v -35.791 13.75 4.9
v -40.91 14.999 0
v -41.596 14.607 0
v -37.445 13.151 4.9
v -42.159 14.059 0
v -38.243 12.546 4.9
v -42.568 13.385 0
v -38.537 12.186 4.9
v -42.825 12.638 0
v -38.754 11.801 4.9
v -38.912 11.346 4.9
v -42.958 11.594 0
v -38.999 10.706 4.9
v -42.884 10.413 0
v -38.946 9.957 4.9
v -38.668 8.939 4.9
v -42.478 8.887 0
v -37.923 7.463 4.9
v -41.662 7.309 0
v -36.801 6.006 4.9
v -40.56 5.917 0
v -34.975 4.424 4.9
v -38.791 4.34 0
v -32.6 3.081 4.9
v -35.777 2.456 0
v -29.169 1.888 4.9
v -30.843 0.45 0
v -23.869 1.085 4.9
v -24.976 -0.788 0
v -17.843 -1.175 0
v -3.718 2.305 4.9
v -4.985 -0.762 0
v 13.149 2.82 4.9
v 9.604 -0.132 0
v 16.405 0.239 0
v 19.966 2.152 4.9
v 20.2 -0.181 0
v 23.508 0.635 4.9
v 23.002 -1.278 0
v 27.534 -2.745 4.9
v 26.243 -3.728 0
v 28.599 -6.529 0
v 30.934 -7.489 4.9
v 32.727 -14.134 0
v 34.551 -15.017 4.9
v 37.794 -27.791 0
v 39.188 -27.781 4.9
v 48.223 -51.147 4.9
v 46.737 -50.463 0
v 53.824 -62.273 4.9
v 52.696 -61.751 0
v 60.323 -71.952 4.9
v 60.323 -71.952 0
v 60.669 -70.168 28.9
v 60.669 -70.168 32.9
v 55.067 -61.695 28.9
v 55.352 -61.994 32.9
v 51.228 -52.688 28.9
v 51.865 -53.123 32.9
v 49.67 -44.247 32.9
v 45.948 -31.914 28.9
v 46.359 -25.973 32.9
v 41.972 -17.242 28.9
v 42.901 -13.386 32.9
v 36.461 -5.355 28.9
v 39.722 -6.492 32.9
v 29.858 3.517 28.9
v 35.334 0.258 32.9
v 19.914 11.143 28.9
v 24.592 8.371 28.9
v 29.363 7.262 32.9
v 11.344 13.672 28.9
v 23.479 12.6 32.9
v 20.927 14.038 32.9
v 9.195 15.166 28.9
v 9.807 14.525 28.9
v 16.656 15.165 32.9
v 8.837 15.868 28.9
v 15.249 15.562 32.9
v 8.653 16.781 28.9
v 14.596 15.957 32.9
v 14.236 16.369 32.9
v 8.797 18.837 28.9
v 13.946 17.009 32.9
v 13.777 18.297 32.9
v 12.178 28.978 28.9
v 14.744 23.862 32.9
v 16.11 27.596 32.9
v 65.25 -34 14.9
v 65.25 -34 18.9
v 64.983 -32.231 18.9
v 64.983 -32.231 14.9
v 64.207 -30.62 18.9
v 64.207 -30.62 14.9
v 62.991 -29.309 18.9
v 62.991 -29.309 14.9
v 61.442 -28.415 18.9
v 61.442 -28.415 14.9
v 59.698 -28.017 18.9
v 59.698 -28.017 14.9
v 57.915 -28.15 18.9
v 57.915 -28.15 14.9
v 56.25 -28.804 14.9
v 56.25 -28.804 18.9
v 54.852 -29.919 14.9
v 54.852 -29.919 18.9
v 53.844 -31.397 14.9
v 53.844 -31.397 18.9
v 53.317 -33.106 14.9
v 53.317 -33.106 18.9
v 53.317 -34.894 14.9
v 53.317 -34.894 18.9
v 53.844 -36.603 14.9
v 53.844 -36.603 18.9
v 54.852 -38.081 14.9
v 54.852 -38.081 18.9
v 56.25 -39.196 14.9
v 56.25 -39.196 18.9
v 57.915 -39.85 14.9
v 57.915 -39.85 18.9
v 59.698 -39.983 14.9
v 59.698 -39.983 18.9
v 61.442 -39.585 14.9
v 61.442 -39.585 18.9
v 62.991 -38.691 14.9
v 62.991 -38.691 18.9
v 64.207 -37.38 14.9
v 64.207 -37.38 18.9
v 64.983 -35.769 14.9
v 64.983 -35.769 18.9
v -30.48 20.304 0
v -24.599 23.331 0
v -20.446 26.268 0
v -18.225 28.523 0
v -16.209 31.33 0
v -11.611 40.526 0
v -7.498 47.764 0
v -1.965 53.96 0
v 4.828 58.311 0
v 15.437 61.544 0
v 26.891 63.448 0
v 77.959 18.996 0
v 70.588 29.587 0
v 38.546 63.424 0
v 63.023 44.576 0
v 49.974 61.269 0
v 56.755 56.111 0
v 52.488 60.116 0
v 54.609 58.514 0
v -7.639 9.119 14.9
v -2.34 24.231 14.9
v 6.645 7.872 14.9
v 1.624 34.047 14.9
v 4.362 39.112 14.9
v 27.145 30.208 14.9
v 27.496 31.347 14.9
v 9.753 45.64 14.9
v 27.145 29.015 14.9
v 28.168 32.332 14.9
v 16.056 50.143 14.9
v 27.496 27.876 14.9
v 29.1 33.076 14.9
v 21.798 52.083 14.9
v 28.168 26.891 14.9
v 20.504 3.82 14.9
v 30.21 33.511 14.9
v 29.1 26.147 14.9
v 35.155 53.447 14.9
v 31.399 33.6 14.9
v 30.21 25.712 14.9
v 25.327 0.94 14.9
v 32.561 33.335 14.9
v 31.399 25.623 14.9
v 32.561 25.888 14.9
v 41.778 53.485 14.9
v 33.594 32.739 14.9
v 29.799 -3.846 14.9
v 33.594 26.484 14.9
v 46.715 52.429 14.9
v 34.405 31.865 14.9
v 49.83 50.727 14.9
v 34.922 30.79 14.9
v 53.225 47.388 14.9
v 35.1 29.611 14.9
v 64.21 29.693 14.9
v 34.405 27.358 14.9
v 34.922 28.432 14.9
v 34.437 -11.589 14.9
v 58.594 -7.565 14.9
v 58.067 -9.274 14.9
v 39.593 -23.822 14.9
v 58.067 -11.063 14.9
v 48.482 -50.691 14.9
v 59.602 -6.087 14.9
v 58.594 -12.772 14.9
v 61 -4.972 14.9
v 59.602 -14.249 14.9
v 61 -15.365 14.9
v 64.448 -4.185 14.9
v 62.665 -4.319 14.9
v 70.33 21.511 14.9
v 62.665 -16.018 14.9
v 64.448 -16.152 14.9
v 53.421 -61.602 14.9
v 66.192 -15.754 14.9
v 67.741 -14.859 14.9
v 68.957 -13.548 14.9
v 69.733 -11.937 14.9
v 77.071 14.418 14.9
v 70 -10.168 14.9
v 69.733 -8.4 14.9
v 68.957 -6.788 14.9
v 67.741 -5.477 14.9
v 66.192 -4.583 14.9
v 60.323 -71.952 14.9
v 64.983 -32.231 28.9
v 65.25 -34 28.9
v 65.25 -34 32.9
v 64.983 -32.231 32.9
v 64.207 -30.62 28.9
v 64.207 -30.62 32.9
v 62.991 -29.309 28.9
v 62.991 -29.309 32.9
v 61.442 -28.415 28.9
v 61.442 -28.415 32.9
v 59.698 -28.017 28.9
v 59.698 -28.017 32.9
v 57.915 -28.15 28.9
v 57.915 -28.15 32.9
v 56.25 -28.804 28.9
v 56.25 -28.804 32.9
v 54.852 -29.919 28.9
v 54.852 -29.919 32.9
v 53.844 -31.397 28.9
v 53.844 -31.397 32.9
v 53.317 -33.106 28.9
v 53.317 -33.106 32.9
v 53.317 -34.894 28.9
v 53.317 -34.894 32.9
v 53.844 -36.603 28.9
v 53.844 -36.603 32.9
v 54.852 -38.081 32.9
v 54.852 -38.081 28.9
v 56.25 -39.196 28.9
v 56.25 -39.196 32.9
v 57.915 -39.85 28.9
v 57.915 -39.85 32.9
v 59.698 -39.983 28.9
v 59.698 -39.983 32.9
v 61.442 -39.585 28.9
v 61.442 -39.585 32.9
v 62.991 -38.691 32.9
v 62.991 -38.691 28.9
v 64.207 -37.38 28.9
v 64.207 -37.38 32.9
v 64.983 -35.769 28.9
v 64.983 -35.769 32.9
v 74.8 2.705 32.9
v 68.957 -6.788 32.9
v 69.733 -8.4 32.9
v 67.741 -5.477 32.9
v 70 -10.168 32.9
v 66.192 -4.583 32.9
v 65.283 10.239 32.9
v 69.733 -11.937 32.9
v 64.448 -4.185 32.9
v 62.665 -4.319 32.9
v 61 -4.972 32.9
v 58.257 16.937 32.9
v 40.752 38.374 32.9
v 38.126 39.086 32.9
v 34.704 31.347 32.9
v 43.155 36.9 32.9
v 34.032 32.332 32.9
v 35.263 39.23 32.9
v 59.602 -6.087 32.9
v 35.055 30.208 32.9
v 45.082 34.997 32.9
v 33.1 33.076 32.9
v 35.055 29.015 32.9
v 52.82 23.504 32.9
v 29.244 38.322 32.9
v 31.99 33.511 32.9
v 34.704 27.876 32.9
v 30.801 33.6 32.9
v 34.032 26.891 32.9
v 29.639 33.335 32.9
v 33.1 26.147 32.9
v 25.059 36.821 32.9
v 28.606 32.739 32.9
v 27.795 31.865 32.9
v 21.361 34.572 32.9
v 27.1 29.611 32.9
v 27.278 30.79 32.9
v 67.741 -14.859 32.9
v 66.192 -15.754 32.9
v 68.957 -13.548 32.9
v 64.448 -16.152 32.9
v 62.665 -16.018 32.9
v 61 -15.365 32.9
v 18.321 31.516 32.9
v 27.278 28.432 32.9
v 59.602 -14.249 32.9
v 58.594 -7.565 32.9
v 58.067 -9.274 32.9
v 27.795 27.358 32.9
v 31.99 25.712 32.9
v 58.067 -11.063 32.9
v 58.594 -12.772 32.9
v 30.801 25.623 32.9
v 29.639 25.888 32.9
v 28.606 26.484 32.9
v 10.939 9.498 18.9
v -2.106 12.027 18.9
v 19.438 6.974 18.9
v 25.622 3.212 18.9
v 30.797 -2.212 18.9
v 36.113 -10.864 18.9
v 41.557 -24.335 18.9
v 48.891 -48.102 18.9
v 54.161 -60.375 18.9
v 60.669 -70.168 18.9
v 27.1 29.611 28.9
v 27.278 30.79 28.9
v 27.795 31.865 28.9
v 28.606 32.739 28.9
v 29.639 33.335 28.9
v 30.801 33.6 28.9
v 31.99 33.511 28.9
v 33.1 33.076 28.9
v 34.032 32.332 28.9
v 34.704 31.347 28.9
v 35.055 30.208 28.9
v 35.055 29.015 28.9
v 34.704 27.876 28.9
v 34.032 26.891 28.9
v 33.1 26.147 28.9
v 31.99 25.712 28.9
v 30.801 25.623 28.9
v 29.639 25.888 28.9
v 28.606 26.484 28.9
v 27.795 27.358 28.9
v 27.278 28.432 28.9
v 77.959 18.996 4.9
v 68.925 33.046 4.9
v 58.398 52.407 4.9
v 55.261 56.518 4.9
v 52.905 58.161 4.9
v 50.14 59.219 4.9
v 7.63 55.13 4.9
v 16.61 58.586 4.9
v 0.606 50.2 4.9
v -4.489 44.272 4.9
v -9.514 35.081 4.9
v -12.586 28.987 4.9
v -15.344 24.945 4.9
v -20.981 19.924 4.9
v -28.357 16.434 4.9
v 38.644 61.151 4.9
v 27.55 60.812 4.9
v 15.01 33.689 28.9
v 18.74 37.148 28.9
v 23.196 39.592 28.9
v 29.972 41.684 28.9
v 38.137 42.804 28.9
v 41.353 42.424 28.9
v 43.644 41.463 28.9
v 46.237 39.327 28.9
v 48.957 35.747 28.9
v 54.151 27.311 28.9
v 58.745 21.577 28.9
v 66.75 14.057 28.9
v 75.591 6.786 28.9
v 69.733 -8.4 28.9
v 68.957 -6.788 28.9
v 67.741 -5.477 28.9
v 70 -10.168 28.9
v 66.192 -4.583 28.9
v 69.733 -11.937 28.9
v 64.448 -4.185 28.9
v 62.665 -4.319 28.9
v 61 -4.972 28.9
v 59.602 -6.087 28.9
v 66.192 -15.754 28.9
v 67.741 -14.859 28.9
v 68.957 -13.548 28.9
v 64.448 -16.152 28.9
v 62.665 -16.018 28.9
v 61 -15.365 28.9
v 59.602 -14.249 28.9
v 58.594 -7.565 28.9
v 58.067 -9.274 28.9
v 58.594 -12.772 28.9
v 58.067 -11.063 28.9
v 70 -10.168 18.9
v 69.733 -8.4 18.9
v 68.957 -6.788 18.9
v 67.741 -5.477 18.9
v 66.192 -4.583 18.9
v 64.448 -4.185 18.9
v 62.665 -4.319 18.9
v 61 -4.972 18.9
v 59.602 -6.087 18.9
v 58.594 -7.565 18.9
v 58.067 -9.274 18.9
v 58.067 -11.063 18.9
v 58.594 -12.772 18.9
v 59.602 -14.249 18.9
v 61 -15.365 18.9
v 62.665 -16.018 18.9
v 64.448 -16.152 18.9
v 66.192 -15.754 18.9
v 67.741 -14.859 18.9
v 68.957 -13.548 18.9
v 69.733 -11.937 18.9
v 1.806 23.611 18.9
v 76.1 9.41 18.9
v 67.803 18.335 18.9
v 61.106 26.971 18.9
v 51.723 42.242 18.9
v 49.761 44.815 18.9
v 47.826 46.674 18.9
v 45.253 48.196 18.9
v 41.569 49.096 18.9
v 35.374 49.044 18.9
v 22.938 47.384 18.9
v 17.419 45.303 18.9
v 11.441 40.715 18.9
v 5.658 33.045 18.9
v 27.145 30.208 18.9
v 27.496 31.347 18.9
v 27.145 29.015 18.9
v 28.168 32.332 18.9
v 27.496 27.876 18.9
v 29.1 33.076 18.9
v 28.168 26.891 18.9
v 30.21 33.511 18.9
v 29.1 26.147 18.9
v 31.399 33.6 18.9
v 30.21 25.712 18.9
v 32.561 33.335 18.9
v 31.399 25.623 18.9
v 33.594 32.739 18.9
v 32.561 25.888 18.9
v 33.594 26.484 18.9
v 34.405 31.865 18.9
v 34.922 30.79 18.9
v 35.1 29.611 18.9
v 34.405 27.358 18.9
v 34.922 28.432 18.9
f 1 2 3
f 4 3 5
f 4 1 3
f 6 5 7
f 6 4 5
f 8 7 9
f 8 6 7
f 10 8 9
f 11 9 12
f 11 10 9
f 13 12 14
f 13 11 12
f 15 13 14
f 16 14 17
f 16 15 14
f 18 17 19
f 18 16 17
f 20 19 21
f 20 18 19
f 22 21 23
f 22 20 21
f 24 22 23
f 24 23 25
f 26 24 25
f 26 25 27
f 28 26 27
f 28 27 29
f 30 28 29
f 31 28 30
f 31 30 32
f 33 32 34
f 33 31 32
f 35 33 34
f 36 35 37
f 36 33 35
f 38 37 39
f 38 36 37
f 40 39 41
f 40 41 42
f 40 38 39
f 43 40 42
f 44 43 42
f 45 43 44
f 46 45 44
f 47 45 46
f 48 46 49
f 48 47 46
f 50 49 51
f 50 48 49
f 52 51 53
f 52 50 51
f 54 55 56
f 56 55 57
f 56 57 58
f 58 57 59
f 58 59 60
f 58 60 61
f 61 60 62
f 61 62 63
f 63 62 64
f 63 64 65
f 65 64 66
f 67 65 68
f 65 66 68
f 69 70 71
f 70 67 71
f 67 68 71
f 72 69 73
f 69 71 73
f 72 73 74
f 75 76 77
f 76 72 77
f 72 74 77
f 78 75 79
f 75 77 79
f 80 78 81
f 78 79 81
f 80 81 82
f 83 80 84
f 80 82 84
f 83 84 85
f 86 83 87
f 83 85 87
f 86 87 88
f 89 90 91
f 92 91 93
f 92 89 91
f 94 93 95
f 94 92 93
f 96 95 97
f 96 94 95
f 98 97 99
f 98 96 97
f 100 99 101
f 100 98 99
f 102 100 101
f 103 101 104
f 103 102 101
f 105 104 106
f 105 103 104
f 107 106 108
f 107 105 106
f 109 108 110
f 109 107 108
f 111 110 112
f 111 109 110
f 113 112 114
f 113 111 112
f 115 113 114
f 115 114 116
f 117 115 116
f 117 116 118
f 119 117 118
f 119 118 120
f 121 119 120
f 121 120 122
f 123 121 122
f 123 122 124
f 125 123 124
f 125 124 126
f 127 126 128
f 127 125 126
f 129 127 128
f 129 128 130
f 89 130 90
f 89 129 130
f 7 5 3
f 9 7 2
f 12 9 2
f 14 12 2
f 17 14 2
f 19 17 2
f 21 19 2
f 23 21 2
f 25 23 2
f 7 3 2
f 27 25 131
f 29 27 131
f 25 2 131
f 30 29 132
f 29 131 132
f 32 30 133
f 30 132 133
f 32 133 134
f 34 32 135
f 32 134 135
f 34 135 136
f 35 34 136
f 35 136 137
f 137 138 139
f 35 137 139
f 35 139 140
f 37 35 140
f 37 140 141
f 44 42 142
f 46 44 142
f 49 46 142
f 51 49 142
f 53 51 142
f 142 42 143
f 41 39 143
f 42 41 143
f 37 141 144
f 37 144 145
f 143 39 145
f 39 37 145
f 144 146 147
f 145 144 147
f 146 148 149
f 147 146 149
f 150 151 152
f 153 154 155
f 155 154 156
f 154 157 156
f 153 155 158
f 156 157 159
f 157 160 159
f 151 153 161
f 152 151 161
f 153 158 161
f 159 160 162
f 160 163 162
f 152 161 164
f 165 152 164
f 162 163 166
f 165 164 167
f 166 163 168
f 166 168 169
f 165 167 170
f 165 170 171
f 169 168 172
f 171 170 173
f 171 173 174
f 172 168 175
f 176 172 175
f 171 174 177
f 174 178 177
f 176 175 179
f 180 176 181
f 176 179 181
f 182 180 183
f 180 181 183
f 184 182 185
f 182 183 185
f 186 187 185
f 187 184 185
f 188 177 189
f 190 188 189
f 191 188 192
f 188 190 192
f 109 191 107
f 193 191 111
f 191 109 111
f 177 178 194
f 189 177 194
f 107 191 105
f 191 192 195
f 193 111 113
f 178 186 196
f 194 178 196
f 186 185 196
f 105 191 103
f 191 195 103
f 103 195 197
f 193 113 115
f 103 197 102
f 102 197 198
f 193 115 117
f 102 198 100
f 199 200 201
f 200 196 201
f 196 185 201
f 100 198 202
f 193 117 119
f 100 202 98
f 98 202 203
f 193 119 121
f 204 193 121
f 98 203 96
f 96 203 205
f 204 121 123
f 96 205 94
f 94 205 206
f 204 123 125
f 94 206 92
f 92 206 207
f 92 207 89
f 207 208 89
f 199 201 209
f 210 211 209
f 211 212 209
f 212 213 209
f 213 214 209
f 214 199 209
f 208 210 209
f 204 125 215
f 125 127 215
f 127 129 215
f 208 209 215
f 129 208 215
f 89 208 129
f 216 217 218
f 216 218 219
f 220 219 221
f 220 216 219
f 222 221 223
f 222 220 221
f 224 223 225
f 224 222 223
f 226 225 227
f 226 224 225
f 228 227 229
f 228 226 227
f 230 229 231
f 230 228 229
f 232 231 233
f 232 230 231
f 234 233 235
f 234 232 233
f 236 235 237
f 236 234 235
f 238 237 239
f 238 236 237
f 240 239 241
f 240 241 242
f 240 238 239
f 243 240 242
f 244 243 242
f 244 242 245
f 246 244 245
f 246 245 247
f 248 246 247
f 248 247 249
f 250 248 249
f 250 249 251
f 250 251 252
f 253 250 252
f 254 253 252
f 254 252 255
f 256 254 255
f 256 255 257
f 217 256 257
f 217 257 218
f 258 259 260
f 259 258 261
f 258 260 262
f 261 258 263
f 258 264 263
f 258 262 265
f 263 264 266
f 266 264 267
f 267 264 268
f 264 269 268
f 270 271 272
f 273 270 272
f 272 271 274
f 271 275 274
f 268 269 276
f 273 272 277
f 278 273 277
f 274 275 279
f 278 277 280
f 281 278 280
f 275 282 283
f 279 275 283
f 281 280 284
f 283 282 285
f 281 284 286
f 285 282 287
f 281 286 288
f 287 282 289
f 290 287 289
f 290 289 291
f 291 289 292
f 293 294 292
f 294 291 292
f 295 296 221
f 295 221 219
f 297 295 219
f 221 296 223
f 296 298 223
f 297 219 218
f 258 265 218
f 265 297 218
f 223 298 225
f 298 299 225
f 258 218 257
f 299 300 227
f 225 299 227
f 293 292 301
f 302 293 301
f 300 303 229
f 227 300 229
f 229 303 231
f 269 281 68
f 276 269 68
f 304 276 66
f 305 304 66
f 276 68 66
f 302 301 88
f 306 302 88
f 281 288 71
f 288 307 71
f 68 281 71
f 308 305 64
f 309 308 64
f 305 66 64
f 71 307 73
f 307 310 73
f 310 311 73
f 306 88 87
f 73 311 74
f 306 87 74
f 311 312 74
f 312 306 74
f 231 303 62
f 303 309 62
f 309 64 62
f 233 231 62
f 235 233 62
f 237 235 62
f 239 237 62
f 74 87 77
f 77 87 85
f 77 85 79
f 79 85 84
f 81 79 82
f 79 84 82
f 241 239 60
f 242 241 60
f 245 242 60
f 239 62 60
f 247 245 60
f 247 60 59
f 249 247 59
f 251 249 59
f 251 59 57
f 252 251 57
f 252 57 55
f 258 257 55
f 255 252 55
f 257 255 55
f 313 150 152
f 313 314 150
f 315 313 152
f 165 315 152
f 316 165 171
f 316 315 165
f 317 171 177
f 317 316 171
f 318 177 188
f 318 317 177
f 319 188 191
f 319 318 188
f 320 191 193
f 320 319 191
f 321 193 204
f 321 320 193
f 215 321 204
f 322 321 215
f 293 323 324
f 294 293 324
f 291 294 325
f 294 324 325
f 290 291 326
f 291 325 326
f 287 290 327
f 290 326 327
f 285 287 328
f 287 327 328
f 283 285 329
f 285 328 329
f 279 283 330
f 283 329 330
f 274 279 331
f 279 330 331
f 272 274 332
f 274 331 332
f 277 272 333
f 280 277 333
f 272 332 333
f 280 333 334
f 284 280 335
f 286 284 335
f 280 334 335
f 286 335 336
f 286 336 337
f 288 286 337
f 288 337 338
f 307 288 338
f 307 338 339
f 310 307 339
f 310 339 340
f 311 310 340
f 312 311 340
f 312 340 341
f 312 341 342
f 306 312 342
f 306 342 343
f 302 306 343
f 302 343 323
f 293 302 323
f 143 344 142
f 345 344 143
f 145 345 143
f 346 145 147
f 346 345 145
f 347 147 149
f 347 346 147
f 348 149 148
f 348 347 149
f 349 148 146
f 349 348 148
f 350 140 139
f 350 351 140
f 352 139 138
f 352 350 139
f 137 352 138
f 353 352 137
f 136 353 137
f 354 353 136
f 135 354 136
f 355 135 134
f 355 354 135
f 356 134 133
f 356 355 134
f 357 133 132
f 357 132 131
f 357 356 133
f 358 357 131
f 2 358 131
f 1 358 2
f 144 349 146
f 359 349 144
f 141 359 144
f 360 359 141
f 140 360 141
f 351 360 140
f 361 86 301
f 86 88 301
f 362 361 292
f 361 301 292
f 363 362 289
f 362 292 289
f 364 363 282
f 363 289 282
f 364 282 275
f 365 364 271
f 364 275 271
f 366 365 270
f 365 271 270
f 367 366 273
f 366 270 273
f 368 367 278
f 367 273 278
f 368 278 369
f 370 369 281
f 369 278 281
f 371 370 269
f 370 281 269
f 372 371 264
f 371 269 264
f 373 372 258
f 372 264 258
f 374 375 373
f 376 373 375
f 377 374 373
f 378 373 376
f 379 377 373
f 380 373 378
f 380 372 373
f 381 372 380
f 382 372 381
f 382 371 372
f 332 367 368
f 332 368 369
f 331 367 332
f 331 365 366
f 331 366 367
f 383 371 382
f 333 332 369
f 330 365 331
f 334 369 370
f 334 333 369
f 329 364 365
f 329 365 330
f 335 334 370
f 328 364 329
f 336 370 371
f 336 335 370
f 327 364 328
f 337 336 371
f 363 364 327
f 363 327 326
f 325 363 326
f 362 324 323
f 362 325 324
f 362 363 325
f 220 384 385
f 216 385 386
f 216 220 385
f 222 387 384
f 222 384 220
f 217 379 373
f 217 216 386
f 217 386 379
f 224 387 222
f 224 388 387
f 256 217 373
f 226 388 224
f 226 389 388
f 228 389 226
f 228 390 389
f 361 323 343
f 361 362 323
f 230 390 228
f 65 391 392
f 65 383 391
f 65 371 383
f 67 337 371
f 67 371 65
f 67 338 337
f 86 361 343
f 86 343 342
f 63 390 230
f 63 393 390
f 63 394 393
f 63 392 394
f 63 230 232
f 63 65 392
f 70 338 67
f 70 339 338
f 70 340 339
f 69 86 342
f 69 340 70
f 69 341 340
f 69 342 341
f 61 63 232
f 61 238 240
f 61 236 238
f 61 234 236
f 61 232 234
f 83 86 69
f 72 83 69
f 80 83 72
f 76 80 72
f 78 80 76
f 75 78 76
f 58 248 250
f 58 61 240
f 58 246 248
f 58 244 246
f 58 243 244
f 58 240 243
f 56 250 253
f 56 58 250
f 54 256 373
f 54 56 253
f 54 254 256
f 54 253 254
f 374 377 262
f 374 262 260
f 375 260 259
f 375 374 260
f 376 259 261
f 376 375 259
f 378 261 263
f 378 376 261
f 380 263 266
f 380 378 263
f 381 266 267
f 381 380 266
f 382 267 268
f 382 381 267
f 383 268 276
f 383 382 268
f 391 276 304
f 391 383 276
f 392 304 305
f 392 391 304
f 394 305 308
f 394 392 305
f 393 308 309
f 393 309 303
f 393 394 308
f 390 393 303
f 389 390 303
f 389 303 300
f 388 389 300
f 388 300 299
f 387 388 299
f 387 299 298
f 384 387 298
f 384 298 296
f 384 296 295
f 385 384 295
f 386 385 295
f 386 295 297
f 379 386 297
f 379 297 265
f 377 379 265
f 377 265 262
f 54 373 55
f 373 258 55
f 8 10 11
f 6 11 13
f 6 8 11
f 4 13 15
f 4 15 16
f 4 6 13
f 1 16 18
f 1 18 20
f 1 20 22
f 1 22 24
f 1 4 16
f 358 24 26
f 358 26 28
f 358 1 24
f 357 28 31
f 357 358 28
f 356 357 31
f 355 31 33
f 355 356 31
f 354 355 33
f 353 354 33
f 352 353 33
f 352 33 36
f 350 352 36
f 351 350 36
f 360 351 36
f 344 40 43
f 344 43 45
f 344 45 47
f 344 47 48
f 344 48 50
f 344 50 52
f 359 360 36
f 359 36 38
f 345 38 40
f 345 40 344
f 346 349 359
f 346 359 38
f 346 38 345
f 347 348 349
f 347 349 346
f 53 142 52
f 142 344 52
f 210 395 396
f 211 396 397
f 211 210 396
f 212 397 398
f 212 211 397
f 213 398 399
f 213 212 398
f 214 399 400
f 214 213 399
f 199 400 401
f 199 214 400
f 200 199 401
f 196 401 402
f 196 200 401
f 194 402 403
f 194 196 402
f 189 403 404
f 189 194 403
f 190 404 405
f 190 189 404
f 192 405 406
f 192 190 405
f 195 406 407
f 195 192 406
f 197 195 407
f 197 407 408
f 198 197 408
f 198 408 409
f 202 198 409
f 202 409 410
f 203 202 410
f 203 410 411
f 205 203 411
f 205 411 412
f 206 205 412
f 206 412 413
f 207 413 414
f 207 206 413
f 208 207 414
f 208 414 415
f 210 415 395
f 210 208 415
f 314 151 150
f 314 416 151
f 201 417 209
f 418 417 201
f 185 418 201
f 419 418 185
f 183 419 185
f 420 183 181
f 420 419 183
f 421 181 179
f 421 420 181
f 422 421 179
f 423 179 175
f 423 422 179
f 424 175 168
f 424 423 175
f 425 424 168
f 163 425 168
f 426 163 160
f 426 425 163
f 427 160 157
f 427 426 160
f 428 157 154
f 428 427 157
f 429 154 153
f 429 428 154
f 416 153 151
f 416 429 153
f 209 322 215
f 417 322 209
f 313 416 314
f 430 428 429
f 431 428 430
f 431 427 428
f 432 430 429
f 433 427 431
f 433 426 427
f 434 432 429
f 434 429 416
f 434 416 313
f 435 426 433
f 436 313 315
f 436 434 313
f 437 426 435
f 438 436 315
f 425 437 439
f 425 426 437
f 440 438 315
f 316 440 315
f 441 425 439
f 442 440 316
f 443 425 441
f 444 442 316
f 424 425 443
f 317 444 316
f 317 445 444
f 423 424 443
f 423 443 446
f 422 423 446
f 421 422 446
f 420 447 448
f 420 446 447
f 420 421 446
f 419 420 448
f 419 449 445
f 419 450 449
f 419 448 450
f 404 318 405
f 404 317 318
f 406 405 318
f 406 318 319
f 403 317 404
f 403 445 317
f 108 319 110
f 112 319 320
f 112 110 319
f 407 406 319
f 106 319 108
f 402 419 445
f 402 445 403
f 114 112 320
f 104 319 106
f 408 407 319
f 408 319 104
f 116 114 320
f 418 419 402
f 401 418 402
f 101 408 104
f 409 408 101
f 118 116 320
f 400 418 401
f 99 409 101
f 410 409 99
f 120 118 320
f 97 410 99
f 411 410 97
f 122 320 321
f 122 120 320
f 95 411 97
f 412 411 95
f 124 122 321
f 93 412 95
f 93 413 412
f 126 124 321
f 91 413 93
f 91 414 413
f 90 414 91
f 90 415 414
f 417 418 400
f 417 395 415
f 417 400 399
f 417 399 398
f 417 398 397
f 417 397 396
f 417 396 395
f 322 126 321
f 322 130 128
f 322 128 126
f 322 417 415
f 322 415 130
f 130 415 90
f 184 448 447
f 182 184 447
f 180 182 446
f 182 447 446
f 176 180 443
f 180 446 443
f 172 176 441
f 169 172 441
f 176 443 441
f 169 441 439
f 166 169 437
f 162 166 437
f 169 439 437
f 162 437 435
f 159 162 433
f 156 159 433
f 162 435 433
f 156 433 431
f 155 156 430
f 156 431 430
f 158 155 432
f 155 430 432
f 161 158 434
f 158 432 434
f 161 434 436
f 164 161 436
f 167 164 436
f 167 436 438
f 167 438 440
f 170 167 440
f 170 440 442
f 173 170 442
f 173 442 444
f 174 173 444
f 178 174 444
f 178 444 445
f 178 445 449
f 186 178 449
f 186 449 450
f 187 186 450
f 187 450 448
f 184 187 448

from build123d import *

# Parameters (mm, degrees)
SKETCH12_R         = 4
CUT_EXTRUDE1_DEPTH = 5
SKETCH10_R         = 4
CUT_EXTRUDE2_DEPTH = 5
CUT_EXTRUDE3_START = -18
SKETCH13_R         = 6
CUT_EXTRUDE3_DEPTH = 18
CUT_EXTRUDE4_START = -18
SKETCH14_R         = 6
CUT_EXTRUDE4_DEPTH = 18


with BuildPart() as part:
    # Loft4: read off the stored shape, not the designer's step
    # Loft4: loft between two sections, ruled curve by curve
    loft4_from = [
        Edge.make_bspline([(77.958571883, 18.995672942, 0), (69.81306901, 28.562918235, 0), (65.663673482, 39.687649157, 0), (58.332437588, 53.951272654, 0), (55.536112417, 58.481649378, 0), (51.421018516, 60.793800861, 0), (49.974275634, 61.268976489, 0)], [0, 0, 0, 0, 0.696575786, 0.725812228, 0.916565813, 1, 1, 1, 1], 3),
        Edge.make_bspline([(49.974275634, 61.268976489, 0), (49.505716798, 61.406841614, 0), (43.396175688, 63.117948118, 0), (31.692607742, 64.373316716, 0), (20.540624005, 62.818902632, 0), (15.436834961, 61.543674215, 0)], [0, 0, 0, 0, 0.041936811, 0.544812334, 1, 1, 1, 1], 3),
        Edge.make_bspline([(15.436834961, 61.543674215, 0), (15.229844727, 61.49722644, 0), (12.630046118, 60.909628297, 0), (8.852473068, 59.95517464, 0), (4.569159319, 58.262211831, 0), (2.290145257, 57.038982671, 0), (-0.755223748, 55.098290452, 0), (-5.087657656, 51.323943166, 0), (-8.529098205, 46.45825302, 0), (-10.270791417, 43.226753988, 0), (-11.925454756, 40.004551376, 0), (-13.772547956, 35.588722463, 0), (-16.615410908, 30.452471026, 0), (-18.758572682, 27.837546837, 0), (-19.892697716, 26.753522216, 0), (-22.268680775, 24.664616568, 0), (-25.527570244, 22.686326073, 0), (-30.393409006, 20.320590313, 0), (-35.158615589, 18.181790597, 0), (-38.845895672, 16.376295987, 0), (-40.910146468, 14.998995279, 0)], [0, 0, 0, 0, 0.008351016, 0.1049053, 0.153071192, 0.189385639, 0.206568258, 0.295206273, 0.414174613, 0.43957708, 0.43957708, 0.556768864, 0.627695873, 0.670087142, 0.689418603, 0.689418603, 0.794559115, 0.838688981, 0.902345365, 1, 1, 1, 1], 3),
        Edge.make_bspline([(-40.910146468, 14.998995279, 0), (-41.313718624, 14.828048382, 0), (-42.104713346, 14.297027207, 0), (-42.823987538, 12.995820262, 0), (-43.100731096, 10.874739053, 0), (-42.647398924, 9.090867466, 0), (-41.812446812, 7.502185164, 0), (-40.799579849, 6.038848574, 0), (-38.745656813, 4.170628409, 0), (-36.490997878, 2.800447275, 0), (-32.721357575, 0.934472543, 0), (-27.187395601, -0.751361165, 0), (-21.050868409, -1.183335038, 0), (-16.681022909, -1.174819004, 0), (-14.710339354, -1.134018104, 0), (-13.528988879, -1.088693105, 0), (-9.033717543, -0.8957394, 0), (-4.818646922, -0.756844424, 0), (1.897478031, -0.525083956, 0), (6.518900926, -0.327620546, 0), (11.135475759, -0.043294434, 0), (14.366054176, 0.188286269, 0), (16.103205928, 0.286260616, 0), (17.833902749, 0.197736688, 0), (19.708253567, -0.001939549, 0), (22.042342351, -0.610613913, 0), (24.756897545, -2.306849034, 0), (27.544732721, -4.919996212, 0), (30.666363777, -9.419394792, 0), (33.764700654, -16.327461193, 0), (35.669469236, -21.763825494, 0), (38.48766089, -29.778340729, 0), (41.341119491, -37.75819805, 0), (45.918265172, -48.893307205, 0), (51.231788136, -59.939494455, 0), (56.452163104, -67.78048221, 0), (60.323211324, -71.952286576, 0)], [0, 0, 0, 0, 0.00837307, 0.017762655, 0.027733621, 0.048779718, 0.05204074, 0.06201082, 0.082660237, 0.104704742, 0.112275845, 0.163078864, 0.214327654, 0.229400171, 0.246603709, 0.251993788, 0.251993788, 0.332593964, 0.332593964, 0.380426295, 0.420991626, 0.420991626, 0.442329007, 0.454134962, 0.454134962, 0.478345256, 0.499621291, 0.514833285, 0.551173963, 0.603629486, 0.659162578, 0.661233481, 0.765955244, 0.821108721, 0.891270538, 1, 1, 1, 1], 3),
        Edge.make_line((77.958571883, 18.995672942, 0), (60.323211324, -71.952286576, 0)),
    ]
    loft4_to = [
        Edge.make_bspline([(77.958571883, 18.995672942, 4.9), (70.675285123, 28.860678419, 4.9), (65.849031326, 38.760145453, 4.9), (58.400678834, 52.491068252, 4.9), (55.778104722, 57.167288543, 4.9), (51.491781801, 58.81911588, 4.9), (50.139948714, 59.21860019, 4.9)], [0, 0, 0, 0, 0.696575786, 0.725812228, 0.916565813, 1, 1, 1, 1], 3),
        Edge.make_bspline([(50.139948714, 59.21860019, 4.9), (49.677036293, 59.355396849, 4.9), (43.590822432, 60.975409128, 4.9), (32.309547383, 61.882945307, 4.9), (21.583293464, 60.023768009, 4.9), (16.609520864, 58.58584891, 4.9)], [0, 0, 0, 0, 0.041936811, 0.544812334, 1, 1, 1, 1], 3),
        Edge.make_bspline([(16.609520864, 58.58584891, 4.9), (16.416431661, 58.530026766, 4.9), (13.993166246, 57.818290236, 4.9), (10.501166746, 56.588137156, 4.9), (6.63124439, 54.646669896, 4.9), (4.574071078, 53.368454521, 4.9), (1.821241951, 51.395991788, 4.9), (-2.143696469, 47.723622385, 4.9), (-5.432090011, 43.076605166, 4.9), (-7.097627007, 39.999493185, 4.9), (-8.695049459, 36.936662836, 4.9), (-10.512640041, 32.752457976, 4.9), (-13.1096156, 27.93951048, 4.9), (-14.929448281, 25.403874873, 4.9), (-15.888560217, 24.302297962, 4.9), (-17.889502616, 22.132453113, 4.9), (-20.72457484, 19.867059753, 4.9), (-25.350118352, 17.475154803, 4.9), (-30.130276288, 15.798353409, 4.9), (-33.822410743, 14.672026557, 4.9), (-35.791116406, 13.75, 4.9)], [0, 0, 0, 0, 0.008351016, 0.1049053, 0.153071192, 0.189385639, 0.206568258, 0.295206273, 0.414174613, 0.43957708, 0.43957708, 0.556768864, 0.627695873, 0.670087142, 0.689418603, 0.689418603, 0.794559115, 0.838688981, 0.902345365, 1, 1, 1, 1], 3),
        Edge.make_bspline([(-35.791116406, 13.75, 4.9), (-36.468482867, 13.600033317, 4.9), (-37.638910897, 13.160589203, 4.9), (-38.700615101, 12.161648471, 4.9), (-39.24000611, 10.367918808, 4.9), (-38.629330815, 8.615115367, 4.9), (-37.679369076, 7.059468177, 4.9), (-36.59934843, 5.659407984, 4.9), (-34.490964387, 3.942949495, 4.9), (-32.12134693, 2.819795092, 4.9), (-28.187774047, 1.479861186, 4.9), (-22.677443886, 0.775369264, 4.9), (-16.670801527, 1.202620362, 4.9), (-12.405749376, 1.625965635, 4.9), (-10.491203974, 1.815280361, 4.9), (-9.348765228, 1.914923081, 4.9), (-5.005483296, 2.282083922, 4.9), (-1.001541337, 2.456989607, 4.9), (5.48641984, 2.653141126, 4.9), (9.996022261, 2.754429051, 4.9), (14.683270709, 2.87722852, 4.9), (17.786854709, 2.607843598, 4.9), (19.398195483, 2.363528433, 4.9), (20.877055705, 1.880390579, 4.9), (22.435534005, 1.26843352, 4.9), (24.27800178, 0.270403694, 4.9), (26.457340732, -1.552617288, 4.9), (28.833903759, -4.15075873, 4.9), (31.791100171, -8.600655202, 4.9), (35.10202664, -16.032322337, 4.9), (37.228190444, -22.181159642, 4.9), (40.330728791, -31.059627703, 4.9), (43.367787061, -39.563350008, 4.9), (47.924120058, -50.692640146, 4.9), (52.906874614, -61.175537076, 4.9), (57.307552014, -68.156327996, 4.9), (60.323211324, -71.952286576, 4.9)], [0, 0, 0, 0, 0.00837307, 0.017762655, 0.027733621, 0.048779718, 0.05204074, 0.06201082, 0.082660237, 0.104704742, 0.112275845, 0.163078864, 0.214327654, 0.229400171, 0.246603709, 0.251993788, 0.251993788, 0.332593964, 0.332593964, 0.380426295, 0.420991626, 0.420991626, 0.442329007, 0.454134962, 0.454134962, 0.478345256, 0.499621291, 0.514833285, 0.551173963, 0.603629486, 0.659162578, 0.661233481, 0.765955244, 0.821108721, 0.891270538, 1, 1, 1, 1], 3),
        Edge.make_line((77.958571883, 18.995672942, 4.9), (60.323211324, -71.952286576, 4.9)),
    ]
    loft4 = Solid(Shell([*[Face.make_surface_from_curves(loft4_from[k], loft4_to[k]) for k in range(5)], Face(Wire(loft4_from)), Face(Wire(loft4_to))]))
    add(loft4)


with BuildPart() as body_2:
    # Sketch5 → Loft5 section 0
    with BuildSketch(Plane.XY.offset(14.9)):
        with BuildLine():
            Line((-2.33970387, 24.231457774), (-7.638772242, 9.119299826))
            add(Edge.make_bspline(
                [(-7.638772242, 9.119299826), (-4.259737159, 8.836488543), (3.564253031, 8.997546536), (13.523482278, 6.127231205), (26.16330004, 2.319373894), (44.43095779, -25.390898016), (45.334066891, -53.607968411), (60.323211324, -71.952286576)],
                knots=[0, 0, 0, 0, 0.088461522, 0.200516231, 0.268799829, 0.424604481, 1, 1, 1, 1], degree=3))
            Line((60.323211324, -71.952286576), (77.071004751, 14.418368197))
            add(Edge.make_bspline(
                [(-2.33970387, 24.231457774), (-0.649462445, 28.043974331), (2.749318341, 39.4489624), (14.839002739, 51.983221928), (32.000008474, 52.956004986), (49.917527377, 55.590584627), (61.260685021, 33.127982199), (69.736181012, 21.279194864), (77.071004751, 14.418368197)],
                knots=[0.098402223, 0.098402223, 0.098402223, 0.098402223, 0.201232002, 0.385973715, 0.462712781, 0.619617817, 0.766138376, 1, 1, 1, 1], degree=3))
        make_face()
    # Sketch6 → Loft5 section 1
    with BuildSketch(Plane.XY.offset(18.9)):
        with BuildLine():
            Line((1.805661875, 23.611468216), (-2.106052036, 12.026777016))
            add(Edge.make_bspline(
                [(-2.106052036, 12.026777016), (-0.176816244, 11.460107512), (5.723325627, 10.288611472), (14.529854717, 9.181118287), (26.887283715, 3.894835269), (45.87957013, -22.763566155), (45.99023137, -52.362533526), (60.669117652, -70.168400468)],
                knots=[0, 0, 0, 0, 0.05418243, 0.162213331, 0.238719582, 0.409718142, 1, 1, 1, 1], degree=3))
            Line((60.669117652, -70.168400468), (76.099905897, 9.410278968))
            add(Edge.make_bspline(
                [(1.805661875, 23.611468216), (4.11120708, 32.881209243), (13.470463933, 46.796093686), (31.965092626, 48.488438301), (47.627870259, 51.15797756), (58.535684353, 28.947486353), (67.966130648, 17.559576155), (76.099905897, 9.410278968)],
                knots=[0, 0, 0, 0, 0.29272325, 0.378195244, 0.535380098, 0.684633531, 1, 1, 1, 1], degree=3))
        make_face()
    loft()

    # Sketch10 → Cut-Extrude2 (cut)
    with BuildSketch(Plane.XY.offset(18.9)):
        with Locations((31.099905897, 29.611468216)):
            Circle(SKETCH10_R)
    extrude(amount=-CUT_EXTRUDE2_DEPTH, mode=Mode.SUBTRACT)


with BuildPart() as body_3:
    # Sketch7 → Loft6 section 0
    with BuildSketch(Plane.XY.offset(28.9)):
        with BuildLine():
            Line((75.591011754, 6.78584247), (60.669117652, -70.168400468))
            add(Edge.make_bspline(
                [(12.177797159, 28.978383554), (11.714671799, 27.682861592), (9.545521698, 22.265916858), (7.332285498, 13.577254844), (18.755760071, 12.591081512), (29.878800117, 5.022551236), (49.07933072, -22.632601206), (46.43319288, -52.833378836), (60.669117652, -70.168400468)],
                knots=[0, 0, 0, 0, 0.063473984, 0.118425302, 0.193565341, 0.283413177, 0.473561281, 1, 1, 1, 1], degree=3))
            add(Edge.make_bspline(
                [(12.177797159, 28.978383554), (15.860066232, 37.551496463), (26.66302196, 41.722007027), (45.558539362, 43.963440527), (54.813924214, 22.449728962), (66.995121102, 13.975144142), (75.591011754, 6.78584247)],
                knots=[0, 0, 0, 0, 0.297065367, 0.416843154, 0.620426244, 1, 1, 1, 1], degree=3))
        make_face()
    # Sketch8 → Loft6 section 1
    with BuildSketch(Plane.XY.offset(32.9)):
        with BuildLine():
            Line((74.799694302, 2.704910449), (60.669117652, -70.168400468))
            add(Edge.make_bspline(
                [(16.110149857, 27.596072915), (15.613295846, 26.95874249), (13.889109908, 21.589390116), (13.424136685, 15.335541349), (21.146144328, 14.927144958), (30.801201788, 6.582722179), (51.660624498, -19.832531712), (46.391604142, -53.00114424), (60.669117652, -70.168400468)],
                knots=[0, 0, 0, 0, 0.061869174, 0.104877434, 0.140990087, 0.232652655, 0.442154724, 1, 1, 1, 1], degree=3))
            add(Edge.make_bspline(
                [(16.110149857, 27.596072915), (18.813902895, 34.397349762), (27.779975561, 39.277046129), (43.52382802, 39.509986545), (53.472220526, 19.735534848), (64.887353701, 10.109533323), (74.799694302, 2.704910449)],
                knots=[0, 0, 0, 0, 0.260298727, 0.368155133, 0.556330145, 1, 1, 1, 1], degree=3))
        make_face()
    loft()

    # Sketch12 → Cut-Extrude1 (cut)
    with BuildSketch(Plane(origin=(0, 0, 28.9), x_dir=(-1, 0, 0), z_dir=(0, 0, -1))):
        with Locations((-31.099905897, 29.611468216)):
            Circle(SKETCH12_R)
    extrude(amount=-CUT_EXTRUDE1_DEPTH, mode=Mode.SUBTRACT)


with BuildPart() as cut_extrude3_tool:
    # Sketch13 → Cut-Extrude3 (new body)
    with BuildSketch(Plane.XY.offset(32.9).offset(CUT_EXTRUDE3_START)):
        with Locations((64, -10.168400468)):
            Circle(SKETCH13_R)
    extrude(amount=CUT_EXTRUDE3_DEPTH)


with BuildPart() as body_2_1:
    add(body_2.part)

    # Cut-Extrude3: cut by cut_extrude3_tool
    add(cut_extrude3_tool.part, mode=Mode.SUBTRACT)


with BuildPart() as body_3_1:
    add(body_3.part)

    # Cut-Extrude3: cut by cut_extrude3_tool
    add(cut_extrude3_tool.part, mode=Mode.SUBTRACT)


with BuildPart() as cut_extrude4_tool:
    # Sketch14 → Cut-Extrude4 (new body)
    with BuildSketch(Plane.XY.offset(32.9).offset(CUT_EXTRUDE4_START)):
        with Locations((59.25, -34)):
            Circle(SKETCH14_R)
    extrude(amount=CUT_EXTRUDE4_DEPTH)


with BuildPart() as body_2_2:
    add(body_2_1.part)

    # Cut-Extrude4: cut by cut_extrude4_tool
    add(cut_extrude4_tool.part, mode=Mode.SUBTRACT)


with BuildPart() as body_3_2:
    add(body_3_1.part)

    # Cut-Extrude4: cut by cut_extrude4_tool
    add(cut_extrude4_tool.part, mode=Mode.SUBTRACT)


solid = Compound([part.part, body_2_2.part, body_3_2.part])
